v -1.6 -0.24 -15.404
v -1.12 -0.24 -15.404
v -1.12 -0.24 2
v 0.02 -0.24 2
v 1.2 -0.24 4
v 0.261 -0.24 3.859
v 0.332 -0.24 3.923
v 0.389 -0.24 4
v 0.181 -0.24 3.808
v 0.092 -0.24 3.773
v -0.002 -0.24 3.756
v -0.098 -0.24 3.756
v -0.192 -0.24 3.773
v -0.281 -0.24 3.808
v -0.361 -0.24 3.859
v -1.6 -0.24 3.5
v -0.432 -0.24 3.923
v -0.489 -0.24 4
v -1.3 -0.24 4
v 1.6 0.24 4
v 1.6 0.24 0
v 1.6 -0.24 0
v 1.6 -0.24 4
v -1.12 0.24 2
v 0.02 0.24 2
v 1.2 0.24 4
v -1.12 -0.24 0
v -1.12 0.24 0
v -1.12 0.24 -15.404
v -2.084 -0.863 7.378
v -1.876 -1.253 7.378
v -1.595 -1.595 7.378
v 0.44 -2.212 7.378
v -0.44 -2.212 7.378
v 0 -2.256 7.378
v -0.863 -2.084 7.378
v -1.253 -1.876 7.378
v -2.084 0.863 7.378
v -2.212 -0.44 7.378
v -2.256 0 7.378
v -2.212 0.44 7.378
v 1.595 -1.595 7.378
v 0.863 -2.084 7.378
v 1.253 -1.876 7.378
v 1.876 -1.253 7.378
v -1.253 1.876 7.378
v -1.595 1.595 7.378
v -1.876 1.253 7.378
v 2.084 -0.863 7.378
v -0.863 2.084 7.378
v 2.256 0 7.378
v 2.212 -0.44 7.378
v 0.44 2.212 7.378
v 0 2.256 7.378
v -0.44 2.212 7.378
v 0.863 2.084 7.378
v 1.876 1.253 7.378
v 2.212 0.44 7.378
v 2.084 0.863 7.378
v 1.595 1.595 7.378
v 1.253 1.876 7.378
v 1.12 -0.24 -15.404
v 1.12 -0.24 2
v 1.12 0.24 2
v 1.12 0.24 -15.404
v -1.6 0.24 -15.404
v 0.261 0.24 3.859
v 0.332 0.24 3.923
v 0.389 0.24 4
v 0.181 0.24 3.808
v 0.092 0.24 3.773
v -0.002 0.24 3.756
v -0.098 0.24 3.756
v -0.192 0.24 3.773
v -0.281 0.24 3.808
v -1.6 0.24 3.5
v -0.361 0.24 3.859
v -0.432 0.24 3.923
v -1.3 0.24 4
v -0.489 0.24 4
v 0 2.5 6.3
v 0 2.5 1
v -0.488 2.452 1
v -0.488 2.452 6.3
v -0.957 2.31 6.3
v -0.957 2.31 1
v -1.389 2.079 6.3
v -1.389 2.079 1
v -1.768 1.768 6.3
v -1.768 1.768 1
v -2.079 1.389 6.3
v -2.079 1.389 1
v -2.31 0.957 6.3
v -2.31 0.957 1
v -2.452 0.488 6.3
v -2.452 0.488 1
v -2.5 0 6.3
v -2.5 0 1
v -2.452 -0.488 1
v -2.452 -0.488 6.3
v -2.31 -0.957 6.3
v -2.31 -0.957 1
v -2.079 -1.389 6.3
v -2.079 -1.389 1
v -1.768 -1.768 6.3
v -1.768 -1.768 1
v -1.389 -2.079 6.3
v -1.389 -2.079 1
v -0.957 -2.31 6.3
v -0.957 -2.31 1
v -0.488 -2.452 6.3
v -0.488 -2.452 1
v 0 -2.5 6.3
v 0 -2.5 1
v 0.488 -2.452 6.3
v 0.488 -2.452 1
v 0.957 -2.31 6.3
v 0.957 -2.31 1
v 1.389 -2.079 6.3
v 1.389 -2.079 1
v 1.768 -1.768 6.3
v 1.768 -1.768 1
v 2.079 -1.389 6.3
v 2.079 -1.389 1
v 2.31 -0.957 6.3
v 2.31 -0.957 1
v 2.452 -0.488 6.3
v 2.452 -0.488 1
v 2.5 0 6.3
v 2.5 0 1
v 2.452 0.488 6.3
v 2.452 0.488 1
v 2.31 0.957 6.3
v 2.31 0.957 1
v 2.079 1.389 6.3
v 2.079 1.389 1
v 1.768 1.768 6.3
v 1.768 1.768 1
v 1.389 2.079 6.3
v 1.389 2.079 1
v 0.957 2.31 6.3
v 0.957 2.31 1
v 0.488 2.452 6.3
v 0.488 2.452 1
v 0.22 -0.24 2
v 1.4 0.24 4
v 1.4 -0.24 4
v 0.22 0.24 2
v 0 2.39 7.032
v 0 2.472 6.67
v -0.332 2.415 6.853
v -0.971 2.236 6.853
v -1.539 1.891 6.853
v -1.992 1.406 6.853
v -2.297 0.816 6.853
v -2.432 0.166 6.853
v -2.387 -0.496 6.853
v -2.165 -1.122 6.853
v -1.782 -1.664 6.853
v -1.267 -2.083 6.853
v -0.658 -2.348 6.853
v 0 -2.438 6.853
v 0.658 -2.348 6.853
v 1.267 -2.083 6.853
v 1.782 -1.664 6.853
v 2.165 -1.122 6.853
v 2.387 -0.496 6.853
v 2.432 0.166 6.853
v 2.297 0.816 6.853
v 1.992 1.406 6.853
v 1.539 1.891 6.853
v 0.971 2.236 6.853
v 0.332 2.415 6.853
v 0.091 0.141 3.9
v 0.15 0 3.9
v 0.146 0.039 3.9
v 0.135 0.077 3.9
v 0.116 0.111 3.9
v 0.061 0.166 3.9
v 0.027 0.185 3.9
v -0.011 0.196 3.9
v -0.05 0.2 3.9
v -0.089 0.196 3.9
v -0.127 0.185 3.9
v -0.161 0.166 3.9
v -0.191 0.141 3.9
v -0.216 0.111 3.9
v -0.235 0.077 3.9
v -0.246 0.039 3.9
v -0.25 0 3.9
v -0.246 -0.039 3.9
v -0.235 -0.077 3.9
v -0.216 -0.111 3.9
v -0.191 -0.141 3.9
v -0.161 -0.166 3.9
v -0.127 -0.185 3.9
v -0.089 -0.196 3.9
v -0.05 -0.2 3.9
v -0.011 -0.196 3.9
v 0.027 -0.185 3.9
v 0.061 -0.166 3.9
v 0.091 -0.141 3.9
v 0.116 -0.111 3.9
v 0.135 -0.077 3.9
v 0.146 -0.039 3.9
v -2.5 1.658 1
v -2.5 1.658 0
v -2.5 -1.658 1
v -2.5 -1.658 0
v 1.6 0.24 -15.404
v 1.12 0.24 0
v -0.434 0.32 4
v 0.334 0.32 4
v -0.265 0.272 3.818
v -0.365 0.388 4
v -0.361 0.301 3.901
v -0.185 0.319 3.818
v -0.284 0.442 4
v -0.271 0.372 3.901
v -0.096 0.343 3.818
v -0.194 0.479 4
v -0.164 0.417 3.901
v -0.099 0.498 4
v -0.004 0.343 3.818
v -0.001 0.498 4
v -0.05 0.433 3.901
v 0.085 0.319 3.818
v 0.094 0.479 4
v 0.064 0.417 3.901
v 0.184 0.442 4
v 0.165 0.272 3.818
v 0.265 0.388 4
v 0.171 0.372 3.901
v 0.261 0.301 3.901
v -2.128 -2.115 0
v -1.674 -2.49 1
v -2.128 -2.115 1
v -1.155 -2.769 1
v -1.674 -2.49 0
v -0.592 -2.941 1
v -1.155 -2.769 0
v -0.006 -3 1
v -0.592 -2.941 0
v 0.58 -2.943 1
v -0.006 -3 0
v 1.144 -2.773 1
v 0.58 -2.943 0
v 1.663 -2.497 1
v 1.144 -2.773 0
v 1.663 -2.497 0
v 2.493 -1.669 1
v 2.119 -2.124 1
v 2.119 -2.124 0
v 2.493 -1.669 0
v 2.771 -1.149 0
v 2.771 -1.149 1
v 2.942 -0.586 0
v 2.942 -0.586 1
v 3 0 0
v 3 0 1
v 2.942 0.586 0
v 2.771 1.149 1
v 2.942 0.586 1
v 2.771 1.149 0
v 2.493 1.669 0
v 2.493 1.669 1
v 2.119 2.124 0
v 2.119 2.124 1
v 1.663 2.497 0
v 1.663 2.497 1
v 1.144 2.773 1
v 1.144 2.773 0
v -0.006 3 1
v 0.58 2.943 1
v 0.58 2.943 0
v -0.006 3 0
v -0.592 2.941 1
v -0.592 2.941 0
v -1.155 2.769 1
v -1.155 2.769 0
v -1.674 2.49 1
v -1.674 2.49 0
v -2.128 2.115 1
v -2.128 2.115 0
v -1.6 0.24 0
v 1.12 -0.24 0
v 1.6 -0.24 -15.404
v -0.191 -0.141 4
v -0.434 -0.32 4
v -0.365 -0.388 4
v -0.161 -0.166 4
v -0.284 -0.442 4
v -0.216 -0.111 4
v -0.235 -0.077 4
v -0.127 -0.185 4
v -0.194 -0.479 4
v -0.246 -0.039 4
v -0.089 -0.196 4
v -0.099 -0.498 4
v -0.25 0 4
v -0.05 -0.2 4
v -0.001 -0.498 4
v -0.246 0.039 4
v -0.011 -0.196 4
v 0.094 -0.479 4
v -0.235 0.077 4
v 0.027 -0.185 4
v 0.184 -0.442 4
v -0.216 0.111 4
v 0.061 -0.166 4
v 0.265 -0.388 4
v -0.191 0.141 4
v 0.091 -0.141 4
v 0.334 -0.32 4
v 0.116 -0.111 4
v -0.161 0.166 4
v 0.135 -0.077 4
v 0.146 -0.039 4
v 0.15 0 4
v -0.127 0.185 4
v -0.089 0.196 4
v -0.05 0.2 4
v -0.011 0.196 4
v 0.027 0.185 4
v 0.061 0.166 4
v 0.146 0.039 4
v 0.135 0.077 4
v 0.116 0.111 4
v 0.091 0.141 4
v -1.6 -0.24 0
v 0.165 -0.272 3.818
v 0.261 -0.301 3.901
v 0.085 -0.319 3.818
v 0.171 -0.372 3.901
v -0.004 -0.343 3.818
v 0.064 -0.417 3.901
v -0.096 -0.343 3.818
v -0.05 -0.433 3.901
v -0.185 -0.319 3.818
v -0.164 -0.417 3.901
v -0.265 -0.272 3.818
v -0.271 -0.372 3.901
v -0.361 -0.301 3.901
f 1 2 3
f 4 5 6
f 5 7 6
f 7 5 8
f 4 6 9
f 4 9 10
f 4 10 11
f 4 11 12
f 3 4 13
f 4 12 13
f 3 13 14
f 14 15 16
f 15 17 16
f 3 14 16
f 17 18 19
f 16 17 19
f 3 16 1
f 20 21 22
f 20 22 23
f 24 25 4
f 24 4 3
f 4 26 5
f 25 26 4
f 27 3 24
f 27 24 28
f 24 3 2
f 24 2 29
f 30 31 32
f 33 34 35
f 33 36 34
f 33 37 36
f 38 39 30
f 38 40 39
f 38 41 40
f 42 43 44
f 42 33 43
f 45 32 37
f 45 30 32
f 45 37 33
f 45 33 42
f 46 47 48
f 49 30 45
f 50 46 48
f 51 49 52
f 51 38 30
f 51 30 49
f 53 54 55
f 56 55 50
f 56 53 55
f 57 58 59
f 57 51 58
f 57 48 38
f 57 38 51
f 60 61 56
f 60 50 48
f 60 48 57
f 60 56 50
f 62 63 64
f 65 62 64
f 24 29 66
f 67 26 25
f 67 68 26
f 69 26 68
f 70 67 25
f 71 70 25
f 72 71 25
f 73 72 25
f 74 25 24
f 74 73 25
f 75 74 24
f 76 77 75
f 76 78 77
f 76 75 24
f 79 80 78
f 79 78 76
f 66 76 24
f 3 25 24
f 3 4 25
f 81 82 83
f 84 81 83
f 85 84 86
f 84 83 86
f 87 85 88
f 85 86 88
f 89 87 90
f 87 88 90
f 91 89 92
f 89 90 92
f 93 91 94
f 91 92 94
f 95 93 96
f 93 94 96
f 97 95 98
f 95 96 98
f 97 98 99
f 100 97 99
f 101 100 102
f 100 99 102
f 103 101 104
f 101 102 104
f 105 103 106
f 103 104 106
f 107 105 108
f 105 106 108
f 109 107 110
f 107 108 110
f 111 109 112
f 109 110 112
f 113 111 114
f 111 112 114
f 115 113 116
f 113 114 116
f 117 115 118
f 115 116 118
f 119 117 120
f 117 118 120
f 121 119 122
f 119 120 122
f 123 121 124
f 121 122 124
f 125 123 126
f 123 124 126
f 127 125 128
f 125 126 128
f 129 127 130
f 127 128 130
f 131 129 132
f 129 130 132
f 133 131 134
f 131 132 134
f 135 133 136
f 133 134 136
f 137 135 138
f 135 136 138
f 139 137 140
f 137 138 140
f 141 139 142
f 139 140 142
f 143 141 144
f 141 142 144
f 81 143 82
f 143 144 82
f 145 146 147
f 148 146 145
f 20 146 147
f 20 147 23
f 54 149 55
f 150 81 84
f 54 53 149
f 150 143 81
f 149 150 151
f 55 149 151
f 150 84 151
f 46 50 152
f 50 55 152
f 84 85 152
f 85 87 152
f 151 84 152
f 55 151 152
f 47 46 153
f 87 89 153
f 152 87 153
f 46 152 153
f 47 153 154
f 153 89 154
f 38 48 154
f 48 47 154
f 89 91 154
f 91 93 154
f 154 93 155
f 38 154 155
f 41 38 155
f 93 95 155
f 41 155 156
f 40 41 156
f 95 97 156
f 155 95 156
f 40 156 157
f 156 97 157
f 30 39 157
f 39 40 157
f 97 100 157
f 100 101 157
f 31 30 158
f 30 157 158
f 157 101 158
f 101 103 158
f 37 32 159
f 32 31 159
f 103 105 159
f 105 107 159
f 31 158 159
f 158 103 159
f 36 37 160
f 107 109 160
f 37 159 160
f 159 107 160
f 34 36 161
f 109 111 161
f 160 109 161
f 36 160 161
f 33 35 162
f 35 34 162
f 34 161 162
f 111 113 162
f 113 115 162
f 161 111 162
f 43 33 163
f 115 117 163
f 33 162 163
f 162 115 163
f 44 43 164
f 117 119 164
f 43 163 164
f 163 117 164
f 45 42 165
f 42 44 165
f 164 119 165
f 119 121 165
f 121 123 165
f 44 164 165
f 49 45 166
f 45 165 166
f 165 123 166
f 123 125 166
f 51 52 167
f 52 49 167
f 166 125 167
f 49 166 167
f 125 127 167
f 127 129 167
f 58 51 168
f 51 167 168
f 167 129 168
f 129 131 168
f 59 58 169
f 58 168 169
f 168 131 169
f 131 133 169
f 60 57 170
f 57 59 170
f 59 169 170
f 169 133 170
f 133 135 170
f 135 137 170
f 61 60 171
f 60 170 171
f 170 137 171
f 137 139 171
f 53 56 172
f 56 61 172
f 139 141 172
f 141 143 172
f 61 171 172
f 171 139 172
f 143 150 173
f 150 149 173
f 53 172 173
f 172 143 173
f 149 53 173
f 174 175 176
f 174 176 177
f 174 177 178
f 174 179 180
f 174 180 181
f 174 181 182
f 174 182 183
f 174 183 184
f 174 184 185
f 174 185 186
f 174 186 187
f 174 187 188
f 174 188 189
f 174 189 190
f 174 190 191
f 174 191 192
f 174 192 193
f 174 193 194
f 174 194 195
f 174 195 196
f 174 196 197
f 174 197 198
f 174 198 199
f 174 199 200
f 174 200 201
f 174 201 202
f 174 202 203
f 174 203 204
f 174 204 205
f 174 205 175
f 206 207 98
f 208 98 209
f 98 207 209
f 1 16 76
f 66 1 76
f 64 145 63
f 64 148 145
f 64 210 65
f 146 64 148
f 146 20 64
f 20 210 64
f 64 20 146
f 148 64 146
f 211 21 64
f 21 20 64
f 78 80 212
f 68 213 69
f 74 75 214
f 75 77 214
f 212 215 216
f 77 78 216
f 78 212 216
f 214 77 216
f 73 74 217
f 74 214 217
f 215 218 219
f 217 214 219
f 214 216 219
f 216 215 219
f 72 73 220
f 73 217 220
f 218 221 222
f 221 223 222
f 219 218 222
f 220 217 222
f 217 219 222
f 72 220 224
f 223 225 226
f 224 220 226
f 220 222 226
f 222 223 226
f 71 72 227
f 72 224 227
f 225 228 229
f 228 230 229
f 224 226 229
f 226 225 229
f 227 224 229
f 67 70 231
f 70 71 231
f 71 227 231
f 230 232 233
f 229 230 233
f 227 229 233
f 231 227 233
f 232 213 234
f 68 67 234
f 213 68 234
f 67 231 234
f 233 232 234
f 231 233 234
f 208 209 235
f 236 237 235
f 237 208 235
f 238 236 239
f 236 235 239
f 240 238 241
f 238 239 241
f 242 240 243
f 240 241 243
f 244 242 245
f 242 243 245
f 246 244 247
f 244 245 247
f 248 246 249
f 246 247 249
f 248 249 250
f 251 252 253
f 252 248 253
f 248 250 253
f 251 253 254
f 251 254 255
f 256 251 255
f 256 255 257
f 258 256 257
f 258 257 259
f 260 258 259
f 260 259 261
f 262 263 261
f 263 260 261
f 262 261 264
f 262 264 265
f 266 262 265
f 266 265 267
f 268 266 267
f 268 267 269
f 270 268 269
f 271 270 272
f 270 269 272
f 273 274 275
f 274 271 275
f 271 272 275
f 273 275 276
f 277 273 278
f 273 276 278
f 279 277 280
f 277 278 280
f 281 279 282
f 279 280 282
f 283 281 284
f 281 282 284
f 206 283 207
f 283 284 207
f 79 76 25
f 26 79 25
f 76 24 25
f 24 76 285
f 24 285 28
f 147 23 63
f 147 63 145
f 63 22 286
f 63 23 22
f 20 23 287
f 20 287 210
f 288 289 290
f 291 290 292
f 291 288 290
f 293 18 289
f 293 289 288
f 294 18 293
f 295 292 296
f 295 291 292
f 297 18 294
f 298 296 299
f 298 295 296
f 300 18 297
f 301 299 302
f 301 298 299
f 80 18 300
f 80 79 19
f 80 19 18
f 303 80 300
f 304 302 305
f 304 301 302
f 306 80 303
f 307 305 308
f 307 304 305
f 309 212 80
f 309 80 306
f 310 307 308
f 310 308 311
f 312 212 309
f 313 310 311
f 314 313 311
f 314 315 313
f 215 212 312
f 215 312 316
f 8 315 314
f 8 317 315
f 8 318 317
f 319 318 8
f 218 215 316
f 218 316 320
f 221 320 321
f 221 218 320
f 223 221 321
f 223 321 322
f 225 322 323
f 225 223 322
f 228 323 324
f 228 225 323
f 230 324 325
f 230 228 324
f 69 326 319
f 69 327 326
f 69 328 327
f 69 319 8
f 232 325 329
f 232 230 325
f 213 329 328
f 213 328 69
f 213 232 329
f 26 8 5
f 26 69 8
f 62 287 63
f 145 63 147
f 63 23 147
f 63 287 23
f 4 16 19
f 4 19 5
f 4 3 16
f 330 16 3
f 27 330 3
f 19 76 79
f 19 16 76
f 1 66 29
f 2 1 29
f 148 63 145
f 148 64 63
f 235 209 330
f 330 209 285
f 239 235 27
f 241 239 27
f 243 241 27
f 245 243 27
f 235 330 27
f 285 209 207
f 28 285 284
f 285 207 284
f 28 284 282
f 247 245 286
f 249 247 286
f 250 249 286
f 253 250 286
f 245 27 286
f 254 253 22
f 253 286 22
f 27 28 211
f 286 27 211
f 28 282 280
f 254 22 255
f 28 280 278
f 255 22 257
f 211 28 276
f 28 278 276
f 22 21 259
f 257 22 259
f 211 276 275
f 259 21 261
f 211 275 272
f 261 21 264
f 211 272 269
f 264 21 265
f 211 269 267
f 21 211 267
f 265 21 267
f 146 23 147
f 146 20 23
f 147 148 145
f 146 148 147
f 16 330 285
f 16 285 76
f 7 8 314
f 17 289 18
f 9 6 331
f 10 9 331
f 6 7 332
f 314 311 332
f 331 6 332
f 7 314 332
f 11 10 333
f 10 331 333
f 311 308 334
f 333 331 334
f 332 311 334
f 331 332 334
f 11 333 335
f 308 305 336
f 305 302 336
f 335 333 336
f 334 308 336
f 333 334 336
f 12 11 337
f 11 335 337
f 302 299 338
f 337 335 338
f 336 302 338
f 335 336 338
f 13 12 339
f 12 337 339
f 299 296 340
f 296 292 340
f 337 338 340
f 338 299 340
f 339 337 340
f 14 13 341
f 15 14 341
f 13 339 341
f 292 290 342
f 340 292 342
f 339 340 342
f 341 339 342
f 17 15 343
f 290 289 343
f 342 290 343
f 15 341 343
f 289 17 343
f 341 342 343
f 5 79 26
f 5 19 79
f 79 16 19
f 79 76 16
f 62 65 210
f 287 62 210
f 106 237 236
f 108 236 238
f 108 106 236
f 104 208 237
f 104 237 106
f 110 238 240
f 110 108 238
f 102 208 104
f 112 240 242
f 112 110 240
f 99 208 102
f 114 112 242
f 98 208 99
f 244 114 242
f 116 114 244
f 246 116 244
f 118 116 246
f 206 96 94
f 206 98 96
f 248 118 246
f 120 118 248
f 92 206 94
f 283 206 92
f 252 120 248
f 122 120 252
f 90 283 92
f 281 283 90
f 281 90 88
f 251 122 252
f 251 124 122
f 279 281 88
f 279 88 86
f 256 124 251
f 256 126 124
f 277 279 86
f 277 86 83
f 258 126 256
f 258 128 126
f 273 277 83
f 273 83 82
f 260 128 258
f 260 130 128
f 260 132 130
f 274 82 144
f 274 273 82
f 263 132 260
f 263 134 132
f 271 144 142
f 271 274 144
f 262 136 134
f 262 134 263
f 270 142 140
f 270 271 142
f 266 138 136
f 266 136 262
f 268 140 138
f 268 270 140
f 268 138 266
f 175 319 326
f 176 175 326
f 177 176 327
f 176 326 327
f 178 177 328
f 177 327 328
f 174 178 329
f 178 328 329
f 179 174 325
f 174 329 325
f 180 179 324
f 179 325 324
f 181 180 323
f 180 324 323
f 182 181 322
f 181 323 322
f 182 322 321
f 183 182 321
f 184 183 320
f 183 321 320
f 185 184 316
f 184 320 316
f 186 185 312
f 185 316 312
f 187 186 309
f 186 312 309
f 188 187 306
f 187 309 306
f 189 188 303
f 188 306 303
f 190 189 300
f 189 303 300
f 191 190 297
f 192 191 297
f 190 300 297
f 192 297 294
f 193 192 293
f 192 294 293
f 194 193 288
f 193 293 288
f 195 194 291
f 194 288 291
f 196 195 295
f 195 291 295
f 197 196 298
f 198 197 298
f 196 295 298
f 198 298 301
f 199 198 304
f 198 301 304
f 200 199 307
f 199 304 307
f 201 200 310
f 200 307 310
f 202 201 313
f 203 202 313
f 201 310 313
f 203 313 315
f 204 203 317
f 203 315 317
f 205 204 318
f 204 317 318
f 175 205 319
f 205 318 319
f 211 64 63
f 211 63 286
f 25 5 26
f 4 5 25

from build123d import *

# Parameters (mm, degrees)
ESBO_O1_R                  = 3
RESSALTO_EXTRUS_O1_DEPTH   = 1
CORTE_EXTRUS_O1_DEPTH      = 1
ESBO_O5_W                  = 0.48
ESBO_O5_H                  = 0.48
RESSALTO_EXTRUS_O2_DEPTH   = 25
RESSALTO_EXTRUS_O2_2_DEPTH = 25
ESBO_O6_W                  = 0.48
ESBO_O6_H                  = 0.48
RESSALTO_EXTRUS_O3_DEPTH   = 2
CORTE_EXTRUS_O2_DEPTH      = 0.24
RESSALTO_EXTRUS_O4_DEPTH   = 0.24
RESSALTO_EXTRUS_O4_2_DEPTH = 0.24
ESBO_O12_R                 = 0.2
CORTE_EXTRUS_O3_DEPTH      = 0.1
SKETCH1_W                  = 40.503516259
SKETCH1_H                  = 63.372853313
SKETCH1_W_2                = 20.905522142
SKETCH1_H_2                = 22.782231705
CUT_EXTRUDE1_DEPTH         = 4
CUT_EXTRUDE1_DEPTH_BACK    = 4


with BuildPart() as part:
    # Esboço1 → Ressalto-extrusão1 (new body)
    with BuildSketch(Plane.XY):
        Circle(ESBO_O1_R)
    extrude(amount=RESSALTO_EXTRUS_O1_DEPTH)

    # Esboço3 → Revolução1 (revolve)
    with BuildSketch(Plane(origin=(0, 0, 0), x_dir=(0, 0, -1), z_dir=(1, 0, 0))):
        with BuildLine():
            Line((-1, 0), (-8.8, 0))
            ThreePointArc((-8.8, 0), (-8.067766953, 1.767766953), (-6.3, 2.5))
            Line((-6.3, 2.5), (-1, 2.5))
            Line((-1, 2.5), (-1, 0))
        make_face()
    revolve(axis=Axis((0, 0, 1), (0, 0, 1)))

    # Esboço4 → Corte-extrusão1 (cut)
    with BuildSketch(Plane(origin=(0, 0, 0), x_dir=(-1, 0, 0), z_dir=(0, 0, -1))):
        with BuildLine():
            Line((2.5, 1.658312395), (2.5, -1.658312395))
            ThreePointArc((2.5, -1.658312395), (3, 0), (2.5, 1.658312395))
        make_face()
    extrude(amount=-CORTE_EXTRUS_O1_DEPTH, mode=Mode.SUBTRACT)

    # Esboço7 → Corte-extrusão2 (cut, symmetric)
    with BuildSketch(Plane(origin=(0, 0, 0), x_dir=(1, 0, 0), z_dir=(0, 1, 0))):
        Polygon((-1.6, 0), (-1.6, -3.5), (-1.3, -4), (1.2, -4), (0.02, -2), (-1.12, -2), (-1.12, 0), align=None)
        Polygon((1.6, 0), (1.6, -4), (1.4, -4), (0.22, -2), (1.12, -2), (1.12, 0), align=None)
    extrude(amount=CORTE_EXTRUS_O2_DEPTH, both=True, mode=Mode.SUBTRACT)


with BuildPart() as body_2:
    # Esboço5 → Ressalto-extrusão2 (new body)
    with BuildSketch(Plane(origin=(0, 0, 0), x_dir=(-1, 0, 0), z_dir=(0, 0, -1))):
        with Locations((-1.36, 0)):
            Rectangle(ESBO_O5_W, ESBO_O5_H)
    extrude(amount=RESSALTO_EXTRUS_O2_DEPTH)


with BuildPart() as body_3:
    # Esboço5 → Ressalto-extrus_o2 2 (new body)
    with BuildSketch(Plane(origin=(0, 0, 0), x_dir=(-1, 0, 0), z_dir=(0, 0, -1))):
        with Locations((1.36, 0)):
            Rectangle(ESBO_O5_W, ESBO_O5_H)
    extrude(amount=RESSALTO_EXTRUS_O2_2_DEPTH)


with BuildPart() as body_4:
    # Esboço6 → Ressalto-extrusão3 (new body)
    with BuildSketch(Plane(origin=(0, 0, -25), x_dir=(-1, 0, 0), z_dir=(0, 0, -1))):
        with Locations((-1.36, 0)):
            Rectangle(ESBO_O6_W, ESBO_O6_H)
    extrude(amount=RESSALTO_EXTRUS_O3_DEPTH)


with BuildPart() as body_5:
    # Esboço8 → Ressalto-extrusão4 (new body, symmetric)
    with BuildSketch(Plane(origin=(0, 0, 0), x_dir=(1, 0, 0), z_dir=(0, 1, 0))):
        Polygon((-1.3, -4), (1.2, -4), (0.02, -2), (-1.12, -2), (-1.12, 0), (-1.6, 0), (-1.6, -3.5), align=None)
    extrude(amount=RESSALTO_EXTRUS_O4_DEPTH, both=True)

    # Combinar2: union body 3
    add(body_3.part)

    # Esboço10 → Corte-Revolução1 (revolve, cut)
    with BuildSketch(Plane(origin=(0, 0, 0), x_dir=(1, 0, 0), z_dir=(0, 1, 0))):
        with BuildLine():
            Line((-0.05, -4), (-0.05, -3.7))
            ThreePointArc((-0.05, -3.7), (-0.341547595, -3.780754009), (-0.55, -4))
            Line((-0.55, -4), (-0.05, -4))
        make_face()
    revolve(axis=Axis((-0.05, 0, 4), (0, 0, -1)), mode=Mode.SUBTRACT)


with BuildPart() as body_6:
    # Esboço8 → Ressalto-extrus_o4 2 (new body, symmetric)
    with BuildSketch(Plane(origin=(0, 0, 0), x_dir=(1, 0, 0), z_dir=(0, 1, 0))):
        Polygon((0.22, -2), (1.4, -4), (1.6, -4), (1.6, 0), (1.12, 0), (1.12, -2), align=None)
    extrude(amount=RESSALTO_EXTRUS_O4_2_DEPTH, both=True)

    # Combinar1: union body 4, body 2
    add(body_4.part)
    add(body_2.part)


with BuildPart() as body_4_2:
    # Esboço11 → Revolução2 (revolve)
    with BuildSketch(Plane(origin=(0, 0, 0), x_dir=(1, 0, 0), z_dir=(0, 1, 0))):
        with BuildLine():
            Line((-0.55, -4), (-0.05, -4))
            Line((-0.05, -4), (-0.05, -3.7))
            ThreePointArc((-0.05, -3.7), (-0.341547595, -3.780754009), (-0.55, -4))
        make_face()
    revolve(axis=Axis((-0.05, 0, 4), (0, 0, -1)))

    # Combinar3: union body 5
    add(body_5.part)

    # Esboço12 → Corte-extrusão3 (cut)
    with BuildSketch(Plane.XY.offset(4)):
        with Locations((-0.05, 0)):
            Circle(ESBO_O12_R)
    extrude(amount=-CORTE_EXTRUS_O3_DEPTH, mode=Mode.SUBTRACT)


with BuildPart() as cut_extrude1_tool:
    # Sketch1 → Cut-Extrude1 (new body, two sides)
    with BuildSketch(Plane(origin=(0, 0, 0), x_dir=(1, 0, 0), z_dir=(0, 1, 0))) as cut_extrude1_sk:
        with Locations((0.838090288, 1.622898698)):
            Rectangle(SKETCH1_W, SKETCH1_H)
        with Locations((-0.529063495, 4.013216122)):
            Rectangle(SKETCH1_W_2, SKETCH1_H_2, mode=Mode.SUBTRACT)
    extrude(amount=CUT_EXTRUDE1_DEPTH)
    extrude(cut_extrude1_sk.sketch, amount=-CUT_EXTRUDE1_DEPTH_BACK)


with BuildPart() as part_1:
    add(part.part)

    # Cut-Extrude1: cut by cut_extrude1_tool
    add(cut_extrude1_tool.part, mode=Mode.SUBTRACT)


with BuildPart() as body_6_1:
    add(body_6.part)

    # Cut-Extrude1: cut by cut_extrude1_tool
    add(cut_extrude1_tool.part, mode=Mode.SUBTRACT)


with BuildPart() as body_4_2_1:
    add(body_4_2.part)

    # Cut-Extrude1: cut by cut_extrude1_tool
    add(cut_extrude1_tool.part, mode=Mode.SUBTRACT)


solid = Compound([part_1.part, body_6_1.part, body_4_2_1.part])
